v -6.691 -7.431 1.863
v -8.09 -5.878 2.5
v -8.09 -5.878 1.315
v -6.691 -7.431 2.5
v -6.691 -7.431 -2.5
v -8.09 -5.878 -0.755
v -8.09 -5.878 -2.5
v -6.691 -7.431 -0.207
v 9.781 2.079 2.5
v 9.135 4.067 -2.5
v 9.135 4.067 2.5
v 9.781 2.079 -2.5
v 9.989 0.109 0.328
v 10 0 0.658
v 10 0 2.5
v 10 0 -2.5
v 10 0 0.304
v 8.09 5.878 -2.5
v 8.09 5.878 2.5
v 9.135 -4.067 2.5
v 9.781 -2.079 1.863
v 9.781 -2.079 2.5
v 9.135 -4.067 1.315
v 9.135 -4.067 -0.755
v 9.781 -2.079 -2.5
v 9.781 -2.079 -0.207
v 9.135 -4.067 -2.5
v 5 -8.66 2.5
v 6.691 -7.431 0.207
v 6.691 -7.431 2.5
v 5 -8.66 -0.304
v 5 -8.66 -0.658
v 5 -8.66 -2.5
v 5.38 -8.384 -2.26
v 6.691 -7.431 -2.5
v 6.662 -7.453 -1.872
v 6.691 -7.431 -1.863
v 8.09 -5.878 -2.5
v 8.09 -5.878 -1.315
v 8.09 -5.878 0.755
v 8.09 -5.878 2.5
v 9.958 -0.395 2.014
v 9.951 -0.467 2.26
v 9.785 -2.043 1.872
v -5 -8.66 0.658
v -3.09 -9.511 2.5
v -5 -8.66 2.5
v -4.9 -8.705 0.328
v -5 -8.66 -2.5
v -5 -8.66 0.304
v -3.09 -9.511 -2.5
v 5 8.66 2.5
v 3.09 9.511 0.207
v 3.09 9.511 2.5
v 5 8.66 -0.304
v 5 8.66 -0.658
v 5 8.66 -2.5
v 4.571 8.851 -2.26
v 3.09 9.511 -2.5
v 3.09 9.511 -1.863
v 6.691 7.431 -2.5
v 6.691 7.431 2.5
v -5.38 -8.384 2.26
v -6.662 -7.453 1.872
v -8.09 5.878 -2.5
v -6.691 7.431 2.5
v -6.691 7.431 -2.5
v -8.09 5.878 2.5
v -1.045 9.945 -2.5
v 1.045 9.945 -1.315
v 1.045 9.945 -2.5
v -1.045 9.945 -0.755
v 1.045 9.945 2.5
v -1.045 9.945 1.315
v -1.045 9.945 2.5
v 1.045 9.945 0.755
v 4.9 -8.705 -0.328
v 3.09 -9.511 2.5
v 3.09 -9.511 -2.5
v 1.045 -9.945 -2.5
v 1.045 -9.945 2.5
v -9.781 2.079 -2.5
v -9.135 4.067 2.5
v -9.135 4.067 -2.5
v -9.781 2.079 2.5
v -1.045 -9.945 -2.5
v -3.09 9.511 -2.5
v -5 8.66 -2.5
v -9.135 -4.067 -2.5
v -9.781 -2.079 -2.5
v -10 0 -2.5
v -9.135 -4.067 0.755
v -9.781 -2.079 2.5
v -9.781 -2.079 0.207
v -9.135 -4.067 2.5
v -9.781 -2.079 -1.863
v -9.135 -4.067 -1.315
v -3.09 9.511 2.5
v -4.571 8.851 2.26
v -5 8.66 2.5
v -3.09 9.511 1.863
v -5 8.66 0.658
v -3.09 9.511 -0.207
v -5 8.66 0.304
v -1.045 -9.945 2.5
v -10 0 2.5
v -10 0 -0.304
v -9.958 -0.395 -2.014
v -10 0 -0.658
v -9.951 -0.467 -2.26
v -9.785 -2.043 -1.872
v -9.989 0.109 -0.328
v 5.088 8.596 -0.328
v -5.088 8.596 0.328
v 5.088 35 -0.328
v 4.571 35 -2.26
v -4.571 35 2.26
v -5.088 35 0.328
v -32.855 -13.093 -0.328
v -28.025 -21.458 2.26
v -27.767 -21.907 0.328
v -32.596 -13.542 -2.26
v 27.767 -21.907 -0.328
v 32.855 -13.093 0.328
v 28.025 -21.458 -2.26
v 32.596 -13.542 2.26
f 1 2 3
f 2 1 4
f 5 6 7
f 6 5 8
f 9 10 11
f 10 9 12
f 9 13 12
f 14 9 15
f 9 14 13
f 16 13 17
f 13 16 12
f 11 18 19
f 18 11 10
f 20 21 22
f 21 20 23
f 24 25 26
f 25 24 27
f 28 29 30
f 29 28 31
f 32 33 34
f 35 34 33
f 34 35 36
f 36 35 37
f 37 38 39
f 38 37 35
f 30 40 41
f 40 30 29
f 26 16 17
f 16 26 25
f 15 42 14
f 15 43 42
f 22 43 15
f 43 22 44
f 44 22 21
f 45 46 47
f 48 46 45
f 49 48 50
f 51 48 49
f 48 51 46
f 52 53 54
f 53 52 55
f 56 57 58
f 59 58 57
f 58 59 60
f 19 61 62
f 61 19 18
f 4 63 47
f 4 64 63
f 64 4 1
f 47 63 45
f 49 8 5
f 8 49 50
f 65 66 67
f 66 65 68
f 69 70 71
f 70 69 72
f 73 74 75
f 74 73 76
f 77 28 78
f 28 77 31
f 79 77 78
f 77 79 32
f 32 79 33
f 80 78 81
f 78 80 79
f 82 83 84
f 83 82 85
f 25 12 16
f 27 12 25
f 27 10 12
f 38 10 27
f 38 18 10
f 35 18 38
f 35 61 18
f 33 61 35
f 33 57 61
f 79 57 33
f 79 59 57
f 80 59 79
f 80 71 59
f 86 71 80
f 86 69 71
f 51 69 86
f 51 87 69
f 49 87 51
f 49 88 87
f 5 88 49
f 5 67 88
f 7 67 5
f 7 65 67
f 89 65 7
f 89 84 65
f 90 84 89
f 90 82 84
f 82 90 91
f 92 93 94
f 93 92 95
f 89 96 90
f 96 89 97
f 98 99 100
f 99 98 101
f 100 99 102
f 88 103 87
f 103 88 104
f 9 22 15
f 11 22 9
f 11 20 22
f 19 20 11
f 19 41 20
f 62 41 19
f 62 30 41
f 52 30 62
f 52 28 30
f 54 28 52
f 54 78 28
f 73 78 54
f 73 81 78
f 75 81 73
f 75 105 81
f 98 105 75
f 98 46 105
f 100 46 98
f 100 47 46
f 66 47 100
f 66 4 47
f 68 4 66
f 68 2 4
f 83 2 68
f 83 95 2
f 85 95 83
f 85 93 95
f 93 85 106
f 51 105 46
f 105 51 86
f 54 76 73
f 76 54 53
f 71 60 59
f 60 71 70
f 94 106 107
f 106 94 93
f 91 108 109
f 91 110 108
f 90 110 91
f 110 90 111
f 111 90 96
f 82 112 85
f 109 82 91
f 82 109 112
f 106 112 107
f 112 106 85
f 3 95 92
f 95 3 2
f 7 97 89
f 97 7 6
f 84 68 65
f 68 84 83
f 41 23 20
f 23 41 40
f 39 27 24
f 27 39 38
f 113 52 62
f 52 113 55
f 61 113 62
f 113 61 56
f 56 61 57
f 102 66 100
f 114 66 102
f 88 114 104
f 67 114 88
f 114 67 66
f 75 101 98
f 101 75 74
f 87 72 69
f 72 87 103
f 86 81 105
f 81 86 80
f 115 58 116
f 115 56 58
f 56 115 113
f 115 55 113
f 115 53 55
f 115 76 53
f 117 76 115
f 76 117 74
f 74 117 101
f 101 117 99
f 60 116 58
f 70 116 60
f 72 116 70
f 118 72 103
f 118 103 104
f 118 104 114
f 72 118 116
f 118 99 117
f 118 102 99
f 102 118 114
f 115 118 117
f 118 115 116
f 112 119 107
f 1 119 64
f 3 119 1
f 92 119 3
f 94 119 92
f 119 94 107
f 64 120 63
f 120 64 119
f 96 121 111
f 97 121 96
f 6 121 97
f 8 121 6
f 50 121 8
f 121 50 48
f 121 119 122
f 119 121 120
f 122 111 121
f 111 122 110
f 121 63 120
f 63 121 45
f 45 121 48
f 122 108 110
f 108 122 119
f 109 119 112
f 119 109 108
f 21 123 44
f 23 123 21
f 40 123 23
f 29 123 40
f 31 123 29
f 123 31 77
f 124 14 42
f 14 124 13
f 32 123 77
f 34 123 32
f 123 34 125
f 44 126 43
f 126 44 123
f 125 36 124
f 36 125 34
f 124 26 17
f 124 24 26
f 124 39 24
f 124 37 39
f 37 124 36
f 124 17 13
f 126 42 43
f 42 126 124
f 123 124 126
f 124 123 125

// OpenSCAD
// Hub
cylinder(d=20, h=5, center=true);

// First blade
rotate([0, 15, 0])
  translate([-5,5,-1])
    cube([10, 30, 2]);

// Second blade
rotate([0, 15, 120])
  translate([-5,5,-1])
    cube([10, 30, 2]);

// Third blade
rotate([0, 15, 240])
  translate([-5,5,-1])
    cube([10, 30, 2]);
